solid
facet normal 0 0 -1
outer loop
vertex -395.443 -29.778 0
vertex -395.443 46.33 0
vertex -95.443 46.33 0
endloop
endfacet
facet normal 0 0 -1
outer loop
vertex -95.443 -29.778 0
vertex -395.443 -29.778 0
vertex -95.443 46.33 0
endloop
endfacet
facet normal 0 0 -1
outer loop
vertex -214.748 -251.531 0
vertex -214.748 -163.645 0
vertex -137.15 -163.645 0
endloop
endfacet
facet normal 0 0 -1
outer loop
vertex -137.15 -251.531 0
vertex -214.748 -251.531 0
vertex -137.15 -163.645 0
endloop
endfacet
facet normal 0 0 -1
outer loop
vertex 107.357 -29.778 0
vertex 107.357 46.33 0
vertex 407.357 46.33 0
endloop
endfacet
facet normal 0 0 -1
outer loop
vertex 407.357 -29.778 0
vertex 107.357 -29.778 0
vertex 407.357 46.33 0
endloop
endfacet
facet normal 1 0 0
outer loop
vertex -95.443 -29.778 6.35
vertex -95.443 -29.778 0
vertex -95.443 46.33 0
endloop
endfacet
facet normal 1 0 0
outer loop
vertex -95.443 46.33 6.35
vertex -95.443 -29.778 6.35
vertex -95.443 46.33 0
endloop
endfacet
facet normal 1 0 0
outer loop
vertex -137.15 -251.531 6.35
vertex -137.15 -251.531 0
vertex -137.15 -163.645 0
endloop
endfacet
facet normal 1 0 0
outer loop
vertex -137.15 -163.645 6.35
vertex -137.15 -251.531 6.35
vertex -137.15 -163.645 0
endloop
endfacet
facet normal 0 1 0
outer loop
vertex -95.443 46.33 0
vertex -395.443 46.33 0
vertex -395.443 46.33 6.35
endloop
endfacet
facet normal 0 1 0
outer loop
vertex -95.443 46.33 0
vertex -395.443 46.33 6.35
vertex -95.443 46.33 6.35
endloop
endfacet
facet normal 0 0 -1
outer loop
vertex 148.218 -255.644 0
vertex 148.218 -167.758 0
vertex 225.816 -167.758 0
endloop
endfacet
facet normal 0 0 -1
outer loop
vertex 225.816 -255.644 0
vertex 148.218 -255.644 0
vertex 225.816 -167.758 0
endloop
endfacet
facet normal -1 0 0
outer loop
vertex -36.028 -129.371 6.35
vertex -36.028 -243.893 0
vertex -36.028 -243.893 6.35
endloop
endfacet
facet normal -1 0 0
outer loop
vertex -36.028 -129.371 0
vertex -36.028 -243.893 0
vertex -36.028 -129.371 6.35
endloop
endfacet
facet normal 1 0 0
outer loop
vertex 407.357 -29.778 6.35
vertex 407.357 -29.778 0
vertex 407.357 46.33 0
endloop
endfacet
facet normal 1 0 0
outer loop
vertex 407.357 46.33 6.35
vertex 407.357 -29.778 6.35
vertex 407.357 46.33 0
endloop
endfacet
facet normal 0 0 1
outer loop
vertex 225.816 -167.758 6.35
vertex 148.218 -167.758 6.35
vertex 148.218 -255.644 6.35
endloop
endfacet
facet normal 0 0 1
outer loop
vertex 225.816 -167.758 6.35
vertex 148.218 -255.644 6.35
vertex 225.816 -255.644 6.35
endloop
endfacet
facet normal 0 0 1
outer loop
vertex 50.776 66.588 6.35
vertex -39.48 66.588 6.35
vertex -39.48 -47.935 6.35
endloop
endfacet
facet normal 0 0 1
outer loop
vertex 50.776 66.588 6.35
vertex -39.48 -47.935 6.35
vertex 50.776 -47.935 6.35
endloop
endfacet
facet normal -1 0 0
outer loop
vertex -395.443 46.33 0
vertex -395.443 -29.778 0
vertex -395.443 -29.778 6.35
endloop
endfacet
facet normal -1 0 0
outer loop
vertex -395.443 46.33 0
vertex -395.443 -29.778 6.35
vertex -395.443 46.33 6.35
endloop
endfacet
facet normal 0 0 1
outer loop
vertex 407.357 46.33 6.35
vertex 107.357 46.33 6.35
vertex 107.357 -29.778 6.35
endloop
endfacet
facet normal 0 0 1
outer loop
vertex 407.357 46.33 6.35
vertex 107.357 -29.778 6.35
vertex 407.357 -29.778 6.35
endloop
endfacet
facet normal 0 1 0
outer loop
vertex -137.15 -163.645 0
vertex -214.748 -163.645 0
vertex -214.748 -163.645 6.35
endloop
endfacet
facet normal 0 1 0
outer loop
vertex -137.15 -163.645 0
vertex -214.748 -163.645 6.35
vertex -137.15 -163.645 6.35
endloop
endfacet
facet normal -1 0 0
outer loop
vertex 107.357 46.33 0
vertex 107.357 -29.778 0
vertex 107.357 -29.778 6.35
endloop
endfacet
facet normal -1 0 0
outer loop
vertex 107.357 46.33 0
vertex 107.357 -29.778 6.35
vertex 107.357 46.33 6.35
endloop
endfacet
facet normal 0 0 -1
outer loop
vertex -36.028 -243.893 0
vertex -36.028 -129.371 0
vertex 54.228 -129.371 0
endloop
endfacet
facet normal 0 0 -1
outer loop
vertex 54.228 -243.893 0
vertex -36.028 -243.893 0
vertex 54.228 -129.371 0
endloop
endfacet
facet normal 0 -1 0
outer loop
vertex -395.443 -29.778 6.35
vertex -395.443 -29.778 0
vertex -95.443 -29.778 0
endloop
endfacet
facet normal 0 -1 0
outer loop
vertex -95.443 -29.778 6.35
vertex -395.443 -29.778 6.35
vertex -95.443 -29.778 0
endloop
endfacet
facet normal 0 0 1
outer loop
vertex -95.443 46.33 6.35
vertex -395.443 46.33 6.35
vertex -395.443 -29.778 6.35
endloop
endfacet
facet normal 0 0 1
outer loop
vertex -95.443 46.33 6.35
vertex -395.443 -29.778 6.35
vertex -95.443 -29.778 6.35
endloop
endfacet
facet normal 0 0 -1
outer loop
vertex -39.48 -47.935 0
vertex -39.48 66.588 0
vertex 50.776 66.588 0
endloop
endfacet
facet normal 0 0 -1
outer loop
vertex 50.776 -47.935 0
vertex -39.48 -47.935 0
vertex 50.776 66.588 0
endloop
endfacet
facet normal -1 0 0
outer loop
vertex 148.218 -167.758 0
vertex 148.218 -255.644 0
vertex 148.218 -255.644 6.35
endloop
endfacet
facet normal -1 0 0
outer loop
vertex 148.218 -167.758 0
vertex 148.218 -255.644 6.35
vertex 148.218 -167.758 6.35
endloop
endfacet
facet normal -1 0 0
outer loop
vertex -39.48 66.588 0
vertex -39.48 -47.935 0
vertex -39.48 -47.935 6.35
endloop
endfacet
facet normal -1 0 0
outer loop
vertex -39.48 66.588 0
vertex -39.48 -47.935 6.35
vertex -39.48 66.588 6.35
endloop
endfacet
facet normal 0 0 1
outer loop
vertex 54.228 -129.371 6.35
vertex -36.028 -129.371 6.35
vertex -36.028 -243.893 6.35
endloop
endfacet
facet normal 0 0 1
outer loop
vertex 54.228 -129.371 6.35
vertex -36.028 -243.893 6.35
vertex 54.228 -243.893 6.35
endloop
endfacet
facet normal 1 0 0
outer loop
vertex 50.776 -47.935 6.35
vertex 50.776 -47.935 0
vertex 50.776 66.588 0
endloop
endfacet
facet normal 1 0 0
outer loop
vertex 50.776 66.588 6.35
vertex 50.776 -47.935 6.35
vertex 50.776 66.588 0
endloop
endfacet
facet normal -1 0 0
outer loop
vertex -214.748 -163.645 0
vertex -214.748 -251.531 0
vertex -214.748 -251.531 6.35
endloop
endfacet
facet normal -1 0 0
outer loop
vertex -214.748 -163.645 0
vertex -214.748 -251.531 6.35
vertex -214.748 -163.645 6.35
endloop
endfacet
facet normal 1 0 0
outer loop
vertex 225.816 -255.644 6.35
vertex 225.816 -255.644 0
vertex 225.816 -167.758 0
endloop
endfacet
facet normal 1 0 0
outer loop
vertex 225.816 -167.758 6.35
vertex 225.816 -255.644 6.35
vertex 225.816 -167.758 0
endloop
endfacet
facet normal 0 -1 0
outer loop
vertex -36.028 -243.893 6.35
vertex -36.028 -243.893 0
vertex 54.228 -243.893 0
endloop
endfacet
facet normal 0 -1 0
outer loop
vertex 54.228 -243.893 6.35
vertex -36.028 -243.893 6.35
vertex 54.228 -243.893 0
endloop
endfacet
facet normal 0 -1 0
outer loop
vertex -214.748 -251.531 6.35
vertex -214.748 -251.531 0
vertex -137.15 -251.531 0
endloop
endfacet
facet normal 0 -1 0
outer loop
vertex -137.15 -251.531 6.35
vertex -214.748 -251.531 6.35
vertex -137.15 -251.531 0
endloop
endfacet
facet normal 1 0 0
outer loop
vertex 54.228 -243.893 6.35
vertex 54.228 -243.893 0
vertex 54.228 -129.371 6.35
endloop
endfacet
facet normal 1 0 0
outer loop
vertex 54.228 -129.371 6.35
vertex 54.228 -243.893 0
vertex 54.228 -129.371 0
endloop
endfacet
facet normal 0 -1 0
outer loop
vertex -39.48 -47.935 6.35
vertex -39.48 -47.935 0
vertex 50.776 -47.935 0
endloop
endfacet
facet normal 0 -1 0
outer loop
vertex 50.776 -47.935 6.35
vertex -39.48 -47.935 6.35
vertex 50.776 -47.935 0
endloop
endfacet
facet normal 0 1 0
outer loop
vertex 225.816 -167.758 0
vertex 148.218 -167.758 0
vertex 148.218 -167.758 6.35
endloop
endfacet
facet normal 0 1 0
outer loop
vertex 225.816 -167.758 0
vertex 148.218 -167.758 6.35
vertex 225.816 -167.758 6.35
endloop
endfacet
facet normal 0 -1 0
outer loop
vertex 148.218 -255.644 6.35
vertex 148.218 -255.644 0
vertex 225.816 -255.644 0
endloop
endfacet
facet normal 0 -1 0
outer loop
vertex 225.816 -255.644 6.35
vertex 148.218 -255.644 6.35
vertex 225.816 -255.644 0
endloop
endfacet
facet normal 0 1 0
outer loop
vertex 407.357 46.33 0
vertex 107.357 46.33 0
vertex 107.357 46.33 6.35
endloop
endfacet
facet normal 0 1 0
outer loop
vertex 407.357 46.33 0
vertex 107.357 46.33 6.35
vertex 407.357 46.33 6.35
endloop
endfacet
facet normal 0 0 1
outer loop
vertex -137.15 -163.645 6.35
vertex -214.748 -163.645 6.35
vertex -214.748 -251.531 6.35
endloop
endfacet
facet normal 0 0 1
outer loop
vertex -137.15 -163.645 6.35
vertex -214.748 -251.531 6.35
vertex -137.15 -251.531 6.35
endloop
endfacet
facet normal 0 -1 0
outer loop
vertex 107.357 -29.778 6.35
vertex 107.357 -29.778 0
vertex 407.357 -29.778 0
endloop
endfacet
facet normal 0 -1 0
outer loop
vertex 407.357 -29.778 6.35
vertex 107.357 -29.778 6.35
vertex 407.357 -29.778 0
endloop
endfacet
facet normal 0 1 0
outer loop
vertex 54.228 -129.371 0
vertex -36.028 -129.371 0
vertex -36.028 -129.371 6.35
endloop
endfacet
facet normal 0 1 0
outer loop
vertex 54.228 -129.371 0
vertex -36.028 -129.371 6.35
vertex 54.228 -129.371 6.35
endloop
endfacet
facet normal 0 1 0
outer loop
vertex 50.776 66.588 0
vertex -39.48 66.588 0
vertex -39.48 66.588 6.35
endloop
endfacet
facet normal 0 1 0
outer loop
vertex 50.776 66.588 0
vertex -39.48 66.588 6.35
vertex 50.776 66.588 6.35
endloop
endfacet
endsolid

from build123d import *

# Parameters (mm, degrees)
SKETCH1_W             = 300
SKETCH1_H             = 76.108230447
BOSS_EXTRUDE1_DEPTH   = 6.35
BOSS_EXTRUDE1_2_DEPTH = 6.35
SKETCH1_W_2           = 90.255895431
SKETCH1_H_2           = 114.522810711
BOSS_EXTRUDE1_3_DEPTH = 6.35
BOSS_EXTRUDE1_4_DEPTH = 6.35
SKETCH1_W_3           = 77.598208687
SKETCH1_H_3           = 87.886173031
BOSS_EXTRUDE1_5_DEPTH = 6.35
BOSS_EXTRUDE1_6_DEPTH = 6.35


with BuildPart() as part:
    # Sketch1 → Boss-Extrude1 (new body)
    with BuildSketch(Plane.XY):
        with Locations((-245.443194985, 8.275954464)):
            Rectangle(SKETCH1_W, SKETCH1_H)
    extrude(amount=BOSS_EXTRUDE1_DEPTH)


with BuildPart() as body_2:
    # Sketch1 → Boss-Extrude1 2 (new body)
    with BuildSketch(Plane.XY):
        with Locations((257.356805015, 8.275954464)):
            Rectangle(SKETCH1_W, SKETCH1_H)
    extrude(amount=BOSS_EXTRUDE1_2_DEPTH)


with BuildPart() as body_3:
    # Sketch1 → Boss-Extrude1 3 (new body)
    with BuildSketch(Plane.XY):
        with Locations((9.100148196, -186.631990495)):
            Rectangle(SKETCH1_W_2, SKETCH1_H_2)
    extrude(amount=BOSS_EXTRUDE1_3_DEPTH)


with BuildPart() as body_4:
    # Sketch1 → Boss-Extrude1 4 (new body)
    with BuildSketch(Plane.XY):
        with Locations((5.648007274, 9.326418088)):
            Rectangle(SKETCH1_W_2, SKETCH1_H_2)
    extrude(amount=BOSS_EXTRUDE1_4_DEPTH)


with BuildPart() as body_5:
    # Sketch1 → Boss-Extrude1 5 (new body)
    with BuildSketch(Plane.XY):
        with Locations((-175.949133489, -207.588268368)):
            Rectangle(SKETCH1_W_3, SKETCH1_H_3)
    extrude(amount=BOSS_EXTRUDE1_5_DEPTH)


with BuildPart() as body_6:
    # Sketch1 → Boss-Extrude1 6 (new body)
    with BuildSketch(Plane.XY):
        with Locations((187.017124595, -211.701168091)):
            Rectangle(SKETCH1_W_3, SKETCH1_H_3)
    extrude(amount=BOSS_EXTRUDE1_6_DEPTH)


solid = Compound([part.part, body_2.part, body_3.part, body_4.part, body_5.part, body_6.part])
